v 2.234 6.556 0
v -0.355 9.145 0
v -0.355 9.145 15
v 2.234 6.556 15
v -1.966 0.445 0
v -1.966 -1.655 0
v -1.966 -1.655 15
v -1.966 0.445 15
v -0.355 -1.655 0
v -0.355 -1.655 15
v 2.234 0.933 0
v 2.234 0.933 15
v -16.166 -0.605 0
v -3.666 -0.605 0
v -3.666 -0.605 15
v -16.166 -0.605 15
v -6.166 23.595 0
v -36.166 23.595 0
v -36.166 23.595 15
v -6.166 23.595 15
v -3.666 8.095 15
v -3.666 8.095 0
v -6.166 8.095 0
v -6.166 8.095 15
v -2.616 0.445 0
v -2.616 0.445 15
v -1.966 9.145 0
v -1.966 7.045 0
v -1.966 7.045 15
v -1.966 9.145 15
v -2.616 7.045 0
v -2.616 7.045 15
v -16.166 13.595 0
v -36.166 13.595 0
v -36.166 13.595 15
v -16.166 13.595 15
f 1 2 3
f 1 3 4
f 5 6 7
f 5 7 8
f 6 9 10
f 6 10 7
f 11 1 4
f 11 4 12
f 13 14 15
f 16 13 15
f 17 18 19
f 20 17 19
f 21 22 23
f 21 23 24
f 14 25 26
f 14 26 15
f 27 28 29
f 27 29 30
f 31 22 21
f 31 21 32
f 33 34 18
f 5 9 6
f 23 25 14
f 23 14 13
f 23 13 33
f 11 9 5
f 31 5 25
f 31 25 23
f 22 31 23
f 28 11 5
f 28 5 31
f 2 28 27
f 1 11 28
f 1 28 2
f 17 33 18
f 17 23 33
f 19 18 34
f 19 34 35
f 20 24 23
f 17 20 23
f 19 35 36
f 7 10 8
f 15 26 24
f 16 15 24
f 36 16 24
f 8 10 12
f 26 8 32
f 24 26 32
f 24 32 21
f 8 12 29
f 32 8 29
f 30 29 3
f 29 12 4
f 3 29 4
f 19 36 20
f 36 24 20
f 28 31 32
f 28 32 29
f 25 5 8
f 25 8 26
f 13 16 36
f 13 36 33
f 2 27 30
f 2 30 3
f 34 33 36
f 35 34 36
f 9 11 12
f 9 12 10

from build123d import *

# Parameters (mm, degrees)
BOSS_EXTRUDE1_DEPTH = 15
SKETCH2_W           = 15
SKETCH2_H           = 8.7
BOSS_EXTRUDE2_DEPTH = 12.5
SKETCH3_W           = 10
SKETCH3_H           = 15
BOSS_EXTRUDE3_DEPTH = 15.5
SKETCH5_W           = 15
SKETCH5_H           = 10
BOSS_EXTRUDE4_DEPTH = 20


with BuildPart() as part:
    # Sketch1 → Boss-Extrude1 (new body)
    with BuildSketch(Plane.XY):
        Polygon((-3.665803919, -0.605497889), (-3.665803919, 8.094502111), (-2.615803919, 7.044502111), (-1.965803919, 7.044502111), (-1.965803919, 9.144502111), (-0.354656646, 9.144502111), (2.234196081, 6.555649384), (2.234196081, 0.933354838), (-0.354656646, -1.655497889), (-1.965803919, -1.655497889), (-1.965803919, 0.444502111), (-2.615803919, 0.444502111), align=None)
    extrude(amount=BOSS_EXTRUDE1_DEPTH)

    # Sketch2 → Boss-Extrude2 (add)
    with BuildSketch(Plane.ZY.offset(3.665803919)):
        with Locations((7.5, 3.744502111)):
            Rectangle(SKETCH2_W, SKETCH2_H)
    extrude(amount=BOSS_EXTRUDE2_DEPTH)

    # Sketch3 → Boss-Extrude3 (add)
    with BuildSketch(Plane(origin=(0, 8.094502111, 0), x_dir=(1, 0, 0), z_dir=(0, 1, 0))):
        with Locations((-11.165803919, -7.5)):
            Rectangle(SKETCH3_W, SKETCH3_H)
    extrude(amount=BOSS_EXTRUDE3_DEPTH)

    # Sketch5 → Boss-Extrude4 (add)
    with BuildSketch(Plane.ZY.offset(16.165803919)):
        with Locations((7.5, 18.594502111)):
            Rectangle(SKETCH5_W, SKETCH5_H)
    extrude(amount=BOSS_EXTRUDE4_DEPTH)


solid = part.part
